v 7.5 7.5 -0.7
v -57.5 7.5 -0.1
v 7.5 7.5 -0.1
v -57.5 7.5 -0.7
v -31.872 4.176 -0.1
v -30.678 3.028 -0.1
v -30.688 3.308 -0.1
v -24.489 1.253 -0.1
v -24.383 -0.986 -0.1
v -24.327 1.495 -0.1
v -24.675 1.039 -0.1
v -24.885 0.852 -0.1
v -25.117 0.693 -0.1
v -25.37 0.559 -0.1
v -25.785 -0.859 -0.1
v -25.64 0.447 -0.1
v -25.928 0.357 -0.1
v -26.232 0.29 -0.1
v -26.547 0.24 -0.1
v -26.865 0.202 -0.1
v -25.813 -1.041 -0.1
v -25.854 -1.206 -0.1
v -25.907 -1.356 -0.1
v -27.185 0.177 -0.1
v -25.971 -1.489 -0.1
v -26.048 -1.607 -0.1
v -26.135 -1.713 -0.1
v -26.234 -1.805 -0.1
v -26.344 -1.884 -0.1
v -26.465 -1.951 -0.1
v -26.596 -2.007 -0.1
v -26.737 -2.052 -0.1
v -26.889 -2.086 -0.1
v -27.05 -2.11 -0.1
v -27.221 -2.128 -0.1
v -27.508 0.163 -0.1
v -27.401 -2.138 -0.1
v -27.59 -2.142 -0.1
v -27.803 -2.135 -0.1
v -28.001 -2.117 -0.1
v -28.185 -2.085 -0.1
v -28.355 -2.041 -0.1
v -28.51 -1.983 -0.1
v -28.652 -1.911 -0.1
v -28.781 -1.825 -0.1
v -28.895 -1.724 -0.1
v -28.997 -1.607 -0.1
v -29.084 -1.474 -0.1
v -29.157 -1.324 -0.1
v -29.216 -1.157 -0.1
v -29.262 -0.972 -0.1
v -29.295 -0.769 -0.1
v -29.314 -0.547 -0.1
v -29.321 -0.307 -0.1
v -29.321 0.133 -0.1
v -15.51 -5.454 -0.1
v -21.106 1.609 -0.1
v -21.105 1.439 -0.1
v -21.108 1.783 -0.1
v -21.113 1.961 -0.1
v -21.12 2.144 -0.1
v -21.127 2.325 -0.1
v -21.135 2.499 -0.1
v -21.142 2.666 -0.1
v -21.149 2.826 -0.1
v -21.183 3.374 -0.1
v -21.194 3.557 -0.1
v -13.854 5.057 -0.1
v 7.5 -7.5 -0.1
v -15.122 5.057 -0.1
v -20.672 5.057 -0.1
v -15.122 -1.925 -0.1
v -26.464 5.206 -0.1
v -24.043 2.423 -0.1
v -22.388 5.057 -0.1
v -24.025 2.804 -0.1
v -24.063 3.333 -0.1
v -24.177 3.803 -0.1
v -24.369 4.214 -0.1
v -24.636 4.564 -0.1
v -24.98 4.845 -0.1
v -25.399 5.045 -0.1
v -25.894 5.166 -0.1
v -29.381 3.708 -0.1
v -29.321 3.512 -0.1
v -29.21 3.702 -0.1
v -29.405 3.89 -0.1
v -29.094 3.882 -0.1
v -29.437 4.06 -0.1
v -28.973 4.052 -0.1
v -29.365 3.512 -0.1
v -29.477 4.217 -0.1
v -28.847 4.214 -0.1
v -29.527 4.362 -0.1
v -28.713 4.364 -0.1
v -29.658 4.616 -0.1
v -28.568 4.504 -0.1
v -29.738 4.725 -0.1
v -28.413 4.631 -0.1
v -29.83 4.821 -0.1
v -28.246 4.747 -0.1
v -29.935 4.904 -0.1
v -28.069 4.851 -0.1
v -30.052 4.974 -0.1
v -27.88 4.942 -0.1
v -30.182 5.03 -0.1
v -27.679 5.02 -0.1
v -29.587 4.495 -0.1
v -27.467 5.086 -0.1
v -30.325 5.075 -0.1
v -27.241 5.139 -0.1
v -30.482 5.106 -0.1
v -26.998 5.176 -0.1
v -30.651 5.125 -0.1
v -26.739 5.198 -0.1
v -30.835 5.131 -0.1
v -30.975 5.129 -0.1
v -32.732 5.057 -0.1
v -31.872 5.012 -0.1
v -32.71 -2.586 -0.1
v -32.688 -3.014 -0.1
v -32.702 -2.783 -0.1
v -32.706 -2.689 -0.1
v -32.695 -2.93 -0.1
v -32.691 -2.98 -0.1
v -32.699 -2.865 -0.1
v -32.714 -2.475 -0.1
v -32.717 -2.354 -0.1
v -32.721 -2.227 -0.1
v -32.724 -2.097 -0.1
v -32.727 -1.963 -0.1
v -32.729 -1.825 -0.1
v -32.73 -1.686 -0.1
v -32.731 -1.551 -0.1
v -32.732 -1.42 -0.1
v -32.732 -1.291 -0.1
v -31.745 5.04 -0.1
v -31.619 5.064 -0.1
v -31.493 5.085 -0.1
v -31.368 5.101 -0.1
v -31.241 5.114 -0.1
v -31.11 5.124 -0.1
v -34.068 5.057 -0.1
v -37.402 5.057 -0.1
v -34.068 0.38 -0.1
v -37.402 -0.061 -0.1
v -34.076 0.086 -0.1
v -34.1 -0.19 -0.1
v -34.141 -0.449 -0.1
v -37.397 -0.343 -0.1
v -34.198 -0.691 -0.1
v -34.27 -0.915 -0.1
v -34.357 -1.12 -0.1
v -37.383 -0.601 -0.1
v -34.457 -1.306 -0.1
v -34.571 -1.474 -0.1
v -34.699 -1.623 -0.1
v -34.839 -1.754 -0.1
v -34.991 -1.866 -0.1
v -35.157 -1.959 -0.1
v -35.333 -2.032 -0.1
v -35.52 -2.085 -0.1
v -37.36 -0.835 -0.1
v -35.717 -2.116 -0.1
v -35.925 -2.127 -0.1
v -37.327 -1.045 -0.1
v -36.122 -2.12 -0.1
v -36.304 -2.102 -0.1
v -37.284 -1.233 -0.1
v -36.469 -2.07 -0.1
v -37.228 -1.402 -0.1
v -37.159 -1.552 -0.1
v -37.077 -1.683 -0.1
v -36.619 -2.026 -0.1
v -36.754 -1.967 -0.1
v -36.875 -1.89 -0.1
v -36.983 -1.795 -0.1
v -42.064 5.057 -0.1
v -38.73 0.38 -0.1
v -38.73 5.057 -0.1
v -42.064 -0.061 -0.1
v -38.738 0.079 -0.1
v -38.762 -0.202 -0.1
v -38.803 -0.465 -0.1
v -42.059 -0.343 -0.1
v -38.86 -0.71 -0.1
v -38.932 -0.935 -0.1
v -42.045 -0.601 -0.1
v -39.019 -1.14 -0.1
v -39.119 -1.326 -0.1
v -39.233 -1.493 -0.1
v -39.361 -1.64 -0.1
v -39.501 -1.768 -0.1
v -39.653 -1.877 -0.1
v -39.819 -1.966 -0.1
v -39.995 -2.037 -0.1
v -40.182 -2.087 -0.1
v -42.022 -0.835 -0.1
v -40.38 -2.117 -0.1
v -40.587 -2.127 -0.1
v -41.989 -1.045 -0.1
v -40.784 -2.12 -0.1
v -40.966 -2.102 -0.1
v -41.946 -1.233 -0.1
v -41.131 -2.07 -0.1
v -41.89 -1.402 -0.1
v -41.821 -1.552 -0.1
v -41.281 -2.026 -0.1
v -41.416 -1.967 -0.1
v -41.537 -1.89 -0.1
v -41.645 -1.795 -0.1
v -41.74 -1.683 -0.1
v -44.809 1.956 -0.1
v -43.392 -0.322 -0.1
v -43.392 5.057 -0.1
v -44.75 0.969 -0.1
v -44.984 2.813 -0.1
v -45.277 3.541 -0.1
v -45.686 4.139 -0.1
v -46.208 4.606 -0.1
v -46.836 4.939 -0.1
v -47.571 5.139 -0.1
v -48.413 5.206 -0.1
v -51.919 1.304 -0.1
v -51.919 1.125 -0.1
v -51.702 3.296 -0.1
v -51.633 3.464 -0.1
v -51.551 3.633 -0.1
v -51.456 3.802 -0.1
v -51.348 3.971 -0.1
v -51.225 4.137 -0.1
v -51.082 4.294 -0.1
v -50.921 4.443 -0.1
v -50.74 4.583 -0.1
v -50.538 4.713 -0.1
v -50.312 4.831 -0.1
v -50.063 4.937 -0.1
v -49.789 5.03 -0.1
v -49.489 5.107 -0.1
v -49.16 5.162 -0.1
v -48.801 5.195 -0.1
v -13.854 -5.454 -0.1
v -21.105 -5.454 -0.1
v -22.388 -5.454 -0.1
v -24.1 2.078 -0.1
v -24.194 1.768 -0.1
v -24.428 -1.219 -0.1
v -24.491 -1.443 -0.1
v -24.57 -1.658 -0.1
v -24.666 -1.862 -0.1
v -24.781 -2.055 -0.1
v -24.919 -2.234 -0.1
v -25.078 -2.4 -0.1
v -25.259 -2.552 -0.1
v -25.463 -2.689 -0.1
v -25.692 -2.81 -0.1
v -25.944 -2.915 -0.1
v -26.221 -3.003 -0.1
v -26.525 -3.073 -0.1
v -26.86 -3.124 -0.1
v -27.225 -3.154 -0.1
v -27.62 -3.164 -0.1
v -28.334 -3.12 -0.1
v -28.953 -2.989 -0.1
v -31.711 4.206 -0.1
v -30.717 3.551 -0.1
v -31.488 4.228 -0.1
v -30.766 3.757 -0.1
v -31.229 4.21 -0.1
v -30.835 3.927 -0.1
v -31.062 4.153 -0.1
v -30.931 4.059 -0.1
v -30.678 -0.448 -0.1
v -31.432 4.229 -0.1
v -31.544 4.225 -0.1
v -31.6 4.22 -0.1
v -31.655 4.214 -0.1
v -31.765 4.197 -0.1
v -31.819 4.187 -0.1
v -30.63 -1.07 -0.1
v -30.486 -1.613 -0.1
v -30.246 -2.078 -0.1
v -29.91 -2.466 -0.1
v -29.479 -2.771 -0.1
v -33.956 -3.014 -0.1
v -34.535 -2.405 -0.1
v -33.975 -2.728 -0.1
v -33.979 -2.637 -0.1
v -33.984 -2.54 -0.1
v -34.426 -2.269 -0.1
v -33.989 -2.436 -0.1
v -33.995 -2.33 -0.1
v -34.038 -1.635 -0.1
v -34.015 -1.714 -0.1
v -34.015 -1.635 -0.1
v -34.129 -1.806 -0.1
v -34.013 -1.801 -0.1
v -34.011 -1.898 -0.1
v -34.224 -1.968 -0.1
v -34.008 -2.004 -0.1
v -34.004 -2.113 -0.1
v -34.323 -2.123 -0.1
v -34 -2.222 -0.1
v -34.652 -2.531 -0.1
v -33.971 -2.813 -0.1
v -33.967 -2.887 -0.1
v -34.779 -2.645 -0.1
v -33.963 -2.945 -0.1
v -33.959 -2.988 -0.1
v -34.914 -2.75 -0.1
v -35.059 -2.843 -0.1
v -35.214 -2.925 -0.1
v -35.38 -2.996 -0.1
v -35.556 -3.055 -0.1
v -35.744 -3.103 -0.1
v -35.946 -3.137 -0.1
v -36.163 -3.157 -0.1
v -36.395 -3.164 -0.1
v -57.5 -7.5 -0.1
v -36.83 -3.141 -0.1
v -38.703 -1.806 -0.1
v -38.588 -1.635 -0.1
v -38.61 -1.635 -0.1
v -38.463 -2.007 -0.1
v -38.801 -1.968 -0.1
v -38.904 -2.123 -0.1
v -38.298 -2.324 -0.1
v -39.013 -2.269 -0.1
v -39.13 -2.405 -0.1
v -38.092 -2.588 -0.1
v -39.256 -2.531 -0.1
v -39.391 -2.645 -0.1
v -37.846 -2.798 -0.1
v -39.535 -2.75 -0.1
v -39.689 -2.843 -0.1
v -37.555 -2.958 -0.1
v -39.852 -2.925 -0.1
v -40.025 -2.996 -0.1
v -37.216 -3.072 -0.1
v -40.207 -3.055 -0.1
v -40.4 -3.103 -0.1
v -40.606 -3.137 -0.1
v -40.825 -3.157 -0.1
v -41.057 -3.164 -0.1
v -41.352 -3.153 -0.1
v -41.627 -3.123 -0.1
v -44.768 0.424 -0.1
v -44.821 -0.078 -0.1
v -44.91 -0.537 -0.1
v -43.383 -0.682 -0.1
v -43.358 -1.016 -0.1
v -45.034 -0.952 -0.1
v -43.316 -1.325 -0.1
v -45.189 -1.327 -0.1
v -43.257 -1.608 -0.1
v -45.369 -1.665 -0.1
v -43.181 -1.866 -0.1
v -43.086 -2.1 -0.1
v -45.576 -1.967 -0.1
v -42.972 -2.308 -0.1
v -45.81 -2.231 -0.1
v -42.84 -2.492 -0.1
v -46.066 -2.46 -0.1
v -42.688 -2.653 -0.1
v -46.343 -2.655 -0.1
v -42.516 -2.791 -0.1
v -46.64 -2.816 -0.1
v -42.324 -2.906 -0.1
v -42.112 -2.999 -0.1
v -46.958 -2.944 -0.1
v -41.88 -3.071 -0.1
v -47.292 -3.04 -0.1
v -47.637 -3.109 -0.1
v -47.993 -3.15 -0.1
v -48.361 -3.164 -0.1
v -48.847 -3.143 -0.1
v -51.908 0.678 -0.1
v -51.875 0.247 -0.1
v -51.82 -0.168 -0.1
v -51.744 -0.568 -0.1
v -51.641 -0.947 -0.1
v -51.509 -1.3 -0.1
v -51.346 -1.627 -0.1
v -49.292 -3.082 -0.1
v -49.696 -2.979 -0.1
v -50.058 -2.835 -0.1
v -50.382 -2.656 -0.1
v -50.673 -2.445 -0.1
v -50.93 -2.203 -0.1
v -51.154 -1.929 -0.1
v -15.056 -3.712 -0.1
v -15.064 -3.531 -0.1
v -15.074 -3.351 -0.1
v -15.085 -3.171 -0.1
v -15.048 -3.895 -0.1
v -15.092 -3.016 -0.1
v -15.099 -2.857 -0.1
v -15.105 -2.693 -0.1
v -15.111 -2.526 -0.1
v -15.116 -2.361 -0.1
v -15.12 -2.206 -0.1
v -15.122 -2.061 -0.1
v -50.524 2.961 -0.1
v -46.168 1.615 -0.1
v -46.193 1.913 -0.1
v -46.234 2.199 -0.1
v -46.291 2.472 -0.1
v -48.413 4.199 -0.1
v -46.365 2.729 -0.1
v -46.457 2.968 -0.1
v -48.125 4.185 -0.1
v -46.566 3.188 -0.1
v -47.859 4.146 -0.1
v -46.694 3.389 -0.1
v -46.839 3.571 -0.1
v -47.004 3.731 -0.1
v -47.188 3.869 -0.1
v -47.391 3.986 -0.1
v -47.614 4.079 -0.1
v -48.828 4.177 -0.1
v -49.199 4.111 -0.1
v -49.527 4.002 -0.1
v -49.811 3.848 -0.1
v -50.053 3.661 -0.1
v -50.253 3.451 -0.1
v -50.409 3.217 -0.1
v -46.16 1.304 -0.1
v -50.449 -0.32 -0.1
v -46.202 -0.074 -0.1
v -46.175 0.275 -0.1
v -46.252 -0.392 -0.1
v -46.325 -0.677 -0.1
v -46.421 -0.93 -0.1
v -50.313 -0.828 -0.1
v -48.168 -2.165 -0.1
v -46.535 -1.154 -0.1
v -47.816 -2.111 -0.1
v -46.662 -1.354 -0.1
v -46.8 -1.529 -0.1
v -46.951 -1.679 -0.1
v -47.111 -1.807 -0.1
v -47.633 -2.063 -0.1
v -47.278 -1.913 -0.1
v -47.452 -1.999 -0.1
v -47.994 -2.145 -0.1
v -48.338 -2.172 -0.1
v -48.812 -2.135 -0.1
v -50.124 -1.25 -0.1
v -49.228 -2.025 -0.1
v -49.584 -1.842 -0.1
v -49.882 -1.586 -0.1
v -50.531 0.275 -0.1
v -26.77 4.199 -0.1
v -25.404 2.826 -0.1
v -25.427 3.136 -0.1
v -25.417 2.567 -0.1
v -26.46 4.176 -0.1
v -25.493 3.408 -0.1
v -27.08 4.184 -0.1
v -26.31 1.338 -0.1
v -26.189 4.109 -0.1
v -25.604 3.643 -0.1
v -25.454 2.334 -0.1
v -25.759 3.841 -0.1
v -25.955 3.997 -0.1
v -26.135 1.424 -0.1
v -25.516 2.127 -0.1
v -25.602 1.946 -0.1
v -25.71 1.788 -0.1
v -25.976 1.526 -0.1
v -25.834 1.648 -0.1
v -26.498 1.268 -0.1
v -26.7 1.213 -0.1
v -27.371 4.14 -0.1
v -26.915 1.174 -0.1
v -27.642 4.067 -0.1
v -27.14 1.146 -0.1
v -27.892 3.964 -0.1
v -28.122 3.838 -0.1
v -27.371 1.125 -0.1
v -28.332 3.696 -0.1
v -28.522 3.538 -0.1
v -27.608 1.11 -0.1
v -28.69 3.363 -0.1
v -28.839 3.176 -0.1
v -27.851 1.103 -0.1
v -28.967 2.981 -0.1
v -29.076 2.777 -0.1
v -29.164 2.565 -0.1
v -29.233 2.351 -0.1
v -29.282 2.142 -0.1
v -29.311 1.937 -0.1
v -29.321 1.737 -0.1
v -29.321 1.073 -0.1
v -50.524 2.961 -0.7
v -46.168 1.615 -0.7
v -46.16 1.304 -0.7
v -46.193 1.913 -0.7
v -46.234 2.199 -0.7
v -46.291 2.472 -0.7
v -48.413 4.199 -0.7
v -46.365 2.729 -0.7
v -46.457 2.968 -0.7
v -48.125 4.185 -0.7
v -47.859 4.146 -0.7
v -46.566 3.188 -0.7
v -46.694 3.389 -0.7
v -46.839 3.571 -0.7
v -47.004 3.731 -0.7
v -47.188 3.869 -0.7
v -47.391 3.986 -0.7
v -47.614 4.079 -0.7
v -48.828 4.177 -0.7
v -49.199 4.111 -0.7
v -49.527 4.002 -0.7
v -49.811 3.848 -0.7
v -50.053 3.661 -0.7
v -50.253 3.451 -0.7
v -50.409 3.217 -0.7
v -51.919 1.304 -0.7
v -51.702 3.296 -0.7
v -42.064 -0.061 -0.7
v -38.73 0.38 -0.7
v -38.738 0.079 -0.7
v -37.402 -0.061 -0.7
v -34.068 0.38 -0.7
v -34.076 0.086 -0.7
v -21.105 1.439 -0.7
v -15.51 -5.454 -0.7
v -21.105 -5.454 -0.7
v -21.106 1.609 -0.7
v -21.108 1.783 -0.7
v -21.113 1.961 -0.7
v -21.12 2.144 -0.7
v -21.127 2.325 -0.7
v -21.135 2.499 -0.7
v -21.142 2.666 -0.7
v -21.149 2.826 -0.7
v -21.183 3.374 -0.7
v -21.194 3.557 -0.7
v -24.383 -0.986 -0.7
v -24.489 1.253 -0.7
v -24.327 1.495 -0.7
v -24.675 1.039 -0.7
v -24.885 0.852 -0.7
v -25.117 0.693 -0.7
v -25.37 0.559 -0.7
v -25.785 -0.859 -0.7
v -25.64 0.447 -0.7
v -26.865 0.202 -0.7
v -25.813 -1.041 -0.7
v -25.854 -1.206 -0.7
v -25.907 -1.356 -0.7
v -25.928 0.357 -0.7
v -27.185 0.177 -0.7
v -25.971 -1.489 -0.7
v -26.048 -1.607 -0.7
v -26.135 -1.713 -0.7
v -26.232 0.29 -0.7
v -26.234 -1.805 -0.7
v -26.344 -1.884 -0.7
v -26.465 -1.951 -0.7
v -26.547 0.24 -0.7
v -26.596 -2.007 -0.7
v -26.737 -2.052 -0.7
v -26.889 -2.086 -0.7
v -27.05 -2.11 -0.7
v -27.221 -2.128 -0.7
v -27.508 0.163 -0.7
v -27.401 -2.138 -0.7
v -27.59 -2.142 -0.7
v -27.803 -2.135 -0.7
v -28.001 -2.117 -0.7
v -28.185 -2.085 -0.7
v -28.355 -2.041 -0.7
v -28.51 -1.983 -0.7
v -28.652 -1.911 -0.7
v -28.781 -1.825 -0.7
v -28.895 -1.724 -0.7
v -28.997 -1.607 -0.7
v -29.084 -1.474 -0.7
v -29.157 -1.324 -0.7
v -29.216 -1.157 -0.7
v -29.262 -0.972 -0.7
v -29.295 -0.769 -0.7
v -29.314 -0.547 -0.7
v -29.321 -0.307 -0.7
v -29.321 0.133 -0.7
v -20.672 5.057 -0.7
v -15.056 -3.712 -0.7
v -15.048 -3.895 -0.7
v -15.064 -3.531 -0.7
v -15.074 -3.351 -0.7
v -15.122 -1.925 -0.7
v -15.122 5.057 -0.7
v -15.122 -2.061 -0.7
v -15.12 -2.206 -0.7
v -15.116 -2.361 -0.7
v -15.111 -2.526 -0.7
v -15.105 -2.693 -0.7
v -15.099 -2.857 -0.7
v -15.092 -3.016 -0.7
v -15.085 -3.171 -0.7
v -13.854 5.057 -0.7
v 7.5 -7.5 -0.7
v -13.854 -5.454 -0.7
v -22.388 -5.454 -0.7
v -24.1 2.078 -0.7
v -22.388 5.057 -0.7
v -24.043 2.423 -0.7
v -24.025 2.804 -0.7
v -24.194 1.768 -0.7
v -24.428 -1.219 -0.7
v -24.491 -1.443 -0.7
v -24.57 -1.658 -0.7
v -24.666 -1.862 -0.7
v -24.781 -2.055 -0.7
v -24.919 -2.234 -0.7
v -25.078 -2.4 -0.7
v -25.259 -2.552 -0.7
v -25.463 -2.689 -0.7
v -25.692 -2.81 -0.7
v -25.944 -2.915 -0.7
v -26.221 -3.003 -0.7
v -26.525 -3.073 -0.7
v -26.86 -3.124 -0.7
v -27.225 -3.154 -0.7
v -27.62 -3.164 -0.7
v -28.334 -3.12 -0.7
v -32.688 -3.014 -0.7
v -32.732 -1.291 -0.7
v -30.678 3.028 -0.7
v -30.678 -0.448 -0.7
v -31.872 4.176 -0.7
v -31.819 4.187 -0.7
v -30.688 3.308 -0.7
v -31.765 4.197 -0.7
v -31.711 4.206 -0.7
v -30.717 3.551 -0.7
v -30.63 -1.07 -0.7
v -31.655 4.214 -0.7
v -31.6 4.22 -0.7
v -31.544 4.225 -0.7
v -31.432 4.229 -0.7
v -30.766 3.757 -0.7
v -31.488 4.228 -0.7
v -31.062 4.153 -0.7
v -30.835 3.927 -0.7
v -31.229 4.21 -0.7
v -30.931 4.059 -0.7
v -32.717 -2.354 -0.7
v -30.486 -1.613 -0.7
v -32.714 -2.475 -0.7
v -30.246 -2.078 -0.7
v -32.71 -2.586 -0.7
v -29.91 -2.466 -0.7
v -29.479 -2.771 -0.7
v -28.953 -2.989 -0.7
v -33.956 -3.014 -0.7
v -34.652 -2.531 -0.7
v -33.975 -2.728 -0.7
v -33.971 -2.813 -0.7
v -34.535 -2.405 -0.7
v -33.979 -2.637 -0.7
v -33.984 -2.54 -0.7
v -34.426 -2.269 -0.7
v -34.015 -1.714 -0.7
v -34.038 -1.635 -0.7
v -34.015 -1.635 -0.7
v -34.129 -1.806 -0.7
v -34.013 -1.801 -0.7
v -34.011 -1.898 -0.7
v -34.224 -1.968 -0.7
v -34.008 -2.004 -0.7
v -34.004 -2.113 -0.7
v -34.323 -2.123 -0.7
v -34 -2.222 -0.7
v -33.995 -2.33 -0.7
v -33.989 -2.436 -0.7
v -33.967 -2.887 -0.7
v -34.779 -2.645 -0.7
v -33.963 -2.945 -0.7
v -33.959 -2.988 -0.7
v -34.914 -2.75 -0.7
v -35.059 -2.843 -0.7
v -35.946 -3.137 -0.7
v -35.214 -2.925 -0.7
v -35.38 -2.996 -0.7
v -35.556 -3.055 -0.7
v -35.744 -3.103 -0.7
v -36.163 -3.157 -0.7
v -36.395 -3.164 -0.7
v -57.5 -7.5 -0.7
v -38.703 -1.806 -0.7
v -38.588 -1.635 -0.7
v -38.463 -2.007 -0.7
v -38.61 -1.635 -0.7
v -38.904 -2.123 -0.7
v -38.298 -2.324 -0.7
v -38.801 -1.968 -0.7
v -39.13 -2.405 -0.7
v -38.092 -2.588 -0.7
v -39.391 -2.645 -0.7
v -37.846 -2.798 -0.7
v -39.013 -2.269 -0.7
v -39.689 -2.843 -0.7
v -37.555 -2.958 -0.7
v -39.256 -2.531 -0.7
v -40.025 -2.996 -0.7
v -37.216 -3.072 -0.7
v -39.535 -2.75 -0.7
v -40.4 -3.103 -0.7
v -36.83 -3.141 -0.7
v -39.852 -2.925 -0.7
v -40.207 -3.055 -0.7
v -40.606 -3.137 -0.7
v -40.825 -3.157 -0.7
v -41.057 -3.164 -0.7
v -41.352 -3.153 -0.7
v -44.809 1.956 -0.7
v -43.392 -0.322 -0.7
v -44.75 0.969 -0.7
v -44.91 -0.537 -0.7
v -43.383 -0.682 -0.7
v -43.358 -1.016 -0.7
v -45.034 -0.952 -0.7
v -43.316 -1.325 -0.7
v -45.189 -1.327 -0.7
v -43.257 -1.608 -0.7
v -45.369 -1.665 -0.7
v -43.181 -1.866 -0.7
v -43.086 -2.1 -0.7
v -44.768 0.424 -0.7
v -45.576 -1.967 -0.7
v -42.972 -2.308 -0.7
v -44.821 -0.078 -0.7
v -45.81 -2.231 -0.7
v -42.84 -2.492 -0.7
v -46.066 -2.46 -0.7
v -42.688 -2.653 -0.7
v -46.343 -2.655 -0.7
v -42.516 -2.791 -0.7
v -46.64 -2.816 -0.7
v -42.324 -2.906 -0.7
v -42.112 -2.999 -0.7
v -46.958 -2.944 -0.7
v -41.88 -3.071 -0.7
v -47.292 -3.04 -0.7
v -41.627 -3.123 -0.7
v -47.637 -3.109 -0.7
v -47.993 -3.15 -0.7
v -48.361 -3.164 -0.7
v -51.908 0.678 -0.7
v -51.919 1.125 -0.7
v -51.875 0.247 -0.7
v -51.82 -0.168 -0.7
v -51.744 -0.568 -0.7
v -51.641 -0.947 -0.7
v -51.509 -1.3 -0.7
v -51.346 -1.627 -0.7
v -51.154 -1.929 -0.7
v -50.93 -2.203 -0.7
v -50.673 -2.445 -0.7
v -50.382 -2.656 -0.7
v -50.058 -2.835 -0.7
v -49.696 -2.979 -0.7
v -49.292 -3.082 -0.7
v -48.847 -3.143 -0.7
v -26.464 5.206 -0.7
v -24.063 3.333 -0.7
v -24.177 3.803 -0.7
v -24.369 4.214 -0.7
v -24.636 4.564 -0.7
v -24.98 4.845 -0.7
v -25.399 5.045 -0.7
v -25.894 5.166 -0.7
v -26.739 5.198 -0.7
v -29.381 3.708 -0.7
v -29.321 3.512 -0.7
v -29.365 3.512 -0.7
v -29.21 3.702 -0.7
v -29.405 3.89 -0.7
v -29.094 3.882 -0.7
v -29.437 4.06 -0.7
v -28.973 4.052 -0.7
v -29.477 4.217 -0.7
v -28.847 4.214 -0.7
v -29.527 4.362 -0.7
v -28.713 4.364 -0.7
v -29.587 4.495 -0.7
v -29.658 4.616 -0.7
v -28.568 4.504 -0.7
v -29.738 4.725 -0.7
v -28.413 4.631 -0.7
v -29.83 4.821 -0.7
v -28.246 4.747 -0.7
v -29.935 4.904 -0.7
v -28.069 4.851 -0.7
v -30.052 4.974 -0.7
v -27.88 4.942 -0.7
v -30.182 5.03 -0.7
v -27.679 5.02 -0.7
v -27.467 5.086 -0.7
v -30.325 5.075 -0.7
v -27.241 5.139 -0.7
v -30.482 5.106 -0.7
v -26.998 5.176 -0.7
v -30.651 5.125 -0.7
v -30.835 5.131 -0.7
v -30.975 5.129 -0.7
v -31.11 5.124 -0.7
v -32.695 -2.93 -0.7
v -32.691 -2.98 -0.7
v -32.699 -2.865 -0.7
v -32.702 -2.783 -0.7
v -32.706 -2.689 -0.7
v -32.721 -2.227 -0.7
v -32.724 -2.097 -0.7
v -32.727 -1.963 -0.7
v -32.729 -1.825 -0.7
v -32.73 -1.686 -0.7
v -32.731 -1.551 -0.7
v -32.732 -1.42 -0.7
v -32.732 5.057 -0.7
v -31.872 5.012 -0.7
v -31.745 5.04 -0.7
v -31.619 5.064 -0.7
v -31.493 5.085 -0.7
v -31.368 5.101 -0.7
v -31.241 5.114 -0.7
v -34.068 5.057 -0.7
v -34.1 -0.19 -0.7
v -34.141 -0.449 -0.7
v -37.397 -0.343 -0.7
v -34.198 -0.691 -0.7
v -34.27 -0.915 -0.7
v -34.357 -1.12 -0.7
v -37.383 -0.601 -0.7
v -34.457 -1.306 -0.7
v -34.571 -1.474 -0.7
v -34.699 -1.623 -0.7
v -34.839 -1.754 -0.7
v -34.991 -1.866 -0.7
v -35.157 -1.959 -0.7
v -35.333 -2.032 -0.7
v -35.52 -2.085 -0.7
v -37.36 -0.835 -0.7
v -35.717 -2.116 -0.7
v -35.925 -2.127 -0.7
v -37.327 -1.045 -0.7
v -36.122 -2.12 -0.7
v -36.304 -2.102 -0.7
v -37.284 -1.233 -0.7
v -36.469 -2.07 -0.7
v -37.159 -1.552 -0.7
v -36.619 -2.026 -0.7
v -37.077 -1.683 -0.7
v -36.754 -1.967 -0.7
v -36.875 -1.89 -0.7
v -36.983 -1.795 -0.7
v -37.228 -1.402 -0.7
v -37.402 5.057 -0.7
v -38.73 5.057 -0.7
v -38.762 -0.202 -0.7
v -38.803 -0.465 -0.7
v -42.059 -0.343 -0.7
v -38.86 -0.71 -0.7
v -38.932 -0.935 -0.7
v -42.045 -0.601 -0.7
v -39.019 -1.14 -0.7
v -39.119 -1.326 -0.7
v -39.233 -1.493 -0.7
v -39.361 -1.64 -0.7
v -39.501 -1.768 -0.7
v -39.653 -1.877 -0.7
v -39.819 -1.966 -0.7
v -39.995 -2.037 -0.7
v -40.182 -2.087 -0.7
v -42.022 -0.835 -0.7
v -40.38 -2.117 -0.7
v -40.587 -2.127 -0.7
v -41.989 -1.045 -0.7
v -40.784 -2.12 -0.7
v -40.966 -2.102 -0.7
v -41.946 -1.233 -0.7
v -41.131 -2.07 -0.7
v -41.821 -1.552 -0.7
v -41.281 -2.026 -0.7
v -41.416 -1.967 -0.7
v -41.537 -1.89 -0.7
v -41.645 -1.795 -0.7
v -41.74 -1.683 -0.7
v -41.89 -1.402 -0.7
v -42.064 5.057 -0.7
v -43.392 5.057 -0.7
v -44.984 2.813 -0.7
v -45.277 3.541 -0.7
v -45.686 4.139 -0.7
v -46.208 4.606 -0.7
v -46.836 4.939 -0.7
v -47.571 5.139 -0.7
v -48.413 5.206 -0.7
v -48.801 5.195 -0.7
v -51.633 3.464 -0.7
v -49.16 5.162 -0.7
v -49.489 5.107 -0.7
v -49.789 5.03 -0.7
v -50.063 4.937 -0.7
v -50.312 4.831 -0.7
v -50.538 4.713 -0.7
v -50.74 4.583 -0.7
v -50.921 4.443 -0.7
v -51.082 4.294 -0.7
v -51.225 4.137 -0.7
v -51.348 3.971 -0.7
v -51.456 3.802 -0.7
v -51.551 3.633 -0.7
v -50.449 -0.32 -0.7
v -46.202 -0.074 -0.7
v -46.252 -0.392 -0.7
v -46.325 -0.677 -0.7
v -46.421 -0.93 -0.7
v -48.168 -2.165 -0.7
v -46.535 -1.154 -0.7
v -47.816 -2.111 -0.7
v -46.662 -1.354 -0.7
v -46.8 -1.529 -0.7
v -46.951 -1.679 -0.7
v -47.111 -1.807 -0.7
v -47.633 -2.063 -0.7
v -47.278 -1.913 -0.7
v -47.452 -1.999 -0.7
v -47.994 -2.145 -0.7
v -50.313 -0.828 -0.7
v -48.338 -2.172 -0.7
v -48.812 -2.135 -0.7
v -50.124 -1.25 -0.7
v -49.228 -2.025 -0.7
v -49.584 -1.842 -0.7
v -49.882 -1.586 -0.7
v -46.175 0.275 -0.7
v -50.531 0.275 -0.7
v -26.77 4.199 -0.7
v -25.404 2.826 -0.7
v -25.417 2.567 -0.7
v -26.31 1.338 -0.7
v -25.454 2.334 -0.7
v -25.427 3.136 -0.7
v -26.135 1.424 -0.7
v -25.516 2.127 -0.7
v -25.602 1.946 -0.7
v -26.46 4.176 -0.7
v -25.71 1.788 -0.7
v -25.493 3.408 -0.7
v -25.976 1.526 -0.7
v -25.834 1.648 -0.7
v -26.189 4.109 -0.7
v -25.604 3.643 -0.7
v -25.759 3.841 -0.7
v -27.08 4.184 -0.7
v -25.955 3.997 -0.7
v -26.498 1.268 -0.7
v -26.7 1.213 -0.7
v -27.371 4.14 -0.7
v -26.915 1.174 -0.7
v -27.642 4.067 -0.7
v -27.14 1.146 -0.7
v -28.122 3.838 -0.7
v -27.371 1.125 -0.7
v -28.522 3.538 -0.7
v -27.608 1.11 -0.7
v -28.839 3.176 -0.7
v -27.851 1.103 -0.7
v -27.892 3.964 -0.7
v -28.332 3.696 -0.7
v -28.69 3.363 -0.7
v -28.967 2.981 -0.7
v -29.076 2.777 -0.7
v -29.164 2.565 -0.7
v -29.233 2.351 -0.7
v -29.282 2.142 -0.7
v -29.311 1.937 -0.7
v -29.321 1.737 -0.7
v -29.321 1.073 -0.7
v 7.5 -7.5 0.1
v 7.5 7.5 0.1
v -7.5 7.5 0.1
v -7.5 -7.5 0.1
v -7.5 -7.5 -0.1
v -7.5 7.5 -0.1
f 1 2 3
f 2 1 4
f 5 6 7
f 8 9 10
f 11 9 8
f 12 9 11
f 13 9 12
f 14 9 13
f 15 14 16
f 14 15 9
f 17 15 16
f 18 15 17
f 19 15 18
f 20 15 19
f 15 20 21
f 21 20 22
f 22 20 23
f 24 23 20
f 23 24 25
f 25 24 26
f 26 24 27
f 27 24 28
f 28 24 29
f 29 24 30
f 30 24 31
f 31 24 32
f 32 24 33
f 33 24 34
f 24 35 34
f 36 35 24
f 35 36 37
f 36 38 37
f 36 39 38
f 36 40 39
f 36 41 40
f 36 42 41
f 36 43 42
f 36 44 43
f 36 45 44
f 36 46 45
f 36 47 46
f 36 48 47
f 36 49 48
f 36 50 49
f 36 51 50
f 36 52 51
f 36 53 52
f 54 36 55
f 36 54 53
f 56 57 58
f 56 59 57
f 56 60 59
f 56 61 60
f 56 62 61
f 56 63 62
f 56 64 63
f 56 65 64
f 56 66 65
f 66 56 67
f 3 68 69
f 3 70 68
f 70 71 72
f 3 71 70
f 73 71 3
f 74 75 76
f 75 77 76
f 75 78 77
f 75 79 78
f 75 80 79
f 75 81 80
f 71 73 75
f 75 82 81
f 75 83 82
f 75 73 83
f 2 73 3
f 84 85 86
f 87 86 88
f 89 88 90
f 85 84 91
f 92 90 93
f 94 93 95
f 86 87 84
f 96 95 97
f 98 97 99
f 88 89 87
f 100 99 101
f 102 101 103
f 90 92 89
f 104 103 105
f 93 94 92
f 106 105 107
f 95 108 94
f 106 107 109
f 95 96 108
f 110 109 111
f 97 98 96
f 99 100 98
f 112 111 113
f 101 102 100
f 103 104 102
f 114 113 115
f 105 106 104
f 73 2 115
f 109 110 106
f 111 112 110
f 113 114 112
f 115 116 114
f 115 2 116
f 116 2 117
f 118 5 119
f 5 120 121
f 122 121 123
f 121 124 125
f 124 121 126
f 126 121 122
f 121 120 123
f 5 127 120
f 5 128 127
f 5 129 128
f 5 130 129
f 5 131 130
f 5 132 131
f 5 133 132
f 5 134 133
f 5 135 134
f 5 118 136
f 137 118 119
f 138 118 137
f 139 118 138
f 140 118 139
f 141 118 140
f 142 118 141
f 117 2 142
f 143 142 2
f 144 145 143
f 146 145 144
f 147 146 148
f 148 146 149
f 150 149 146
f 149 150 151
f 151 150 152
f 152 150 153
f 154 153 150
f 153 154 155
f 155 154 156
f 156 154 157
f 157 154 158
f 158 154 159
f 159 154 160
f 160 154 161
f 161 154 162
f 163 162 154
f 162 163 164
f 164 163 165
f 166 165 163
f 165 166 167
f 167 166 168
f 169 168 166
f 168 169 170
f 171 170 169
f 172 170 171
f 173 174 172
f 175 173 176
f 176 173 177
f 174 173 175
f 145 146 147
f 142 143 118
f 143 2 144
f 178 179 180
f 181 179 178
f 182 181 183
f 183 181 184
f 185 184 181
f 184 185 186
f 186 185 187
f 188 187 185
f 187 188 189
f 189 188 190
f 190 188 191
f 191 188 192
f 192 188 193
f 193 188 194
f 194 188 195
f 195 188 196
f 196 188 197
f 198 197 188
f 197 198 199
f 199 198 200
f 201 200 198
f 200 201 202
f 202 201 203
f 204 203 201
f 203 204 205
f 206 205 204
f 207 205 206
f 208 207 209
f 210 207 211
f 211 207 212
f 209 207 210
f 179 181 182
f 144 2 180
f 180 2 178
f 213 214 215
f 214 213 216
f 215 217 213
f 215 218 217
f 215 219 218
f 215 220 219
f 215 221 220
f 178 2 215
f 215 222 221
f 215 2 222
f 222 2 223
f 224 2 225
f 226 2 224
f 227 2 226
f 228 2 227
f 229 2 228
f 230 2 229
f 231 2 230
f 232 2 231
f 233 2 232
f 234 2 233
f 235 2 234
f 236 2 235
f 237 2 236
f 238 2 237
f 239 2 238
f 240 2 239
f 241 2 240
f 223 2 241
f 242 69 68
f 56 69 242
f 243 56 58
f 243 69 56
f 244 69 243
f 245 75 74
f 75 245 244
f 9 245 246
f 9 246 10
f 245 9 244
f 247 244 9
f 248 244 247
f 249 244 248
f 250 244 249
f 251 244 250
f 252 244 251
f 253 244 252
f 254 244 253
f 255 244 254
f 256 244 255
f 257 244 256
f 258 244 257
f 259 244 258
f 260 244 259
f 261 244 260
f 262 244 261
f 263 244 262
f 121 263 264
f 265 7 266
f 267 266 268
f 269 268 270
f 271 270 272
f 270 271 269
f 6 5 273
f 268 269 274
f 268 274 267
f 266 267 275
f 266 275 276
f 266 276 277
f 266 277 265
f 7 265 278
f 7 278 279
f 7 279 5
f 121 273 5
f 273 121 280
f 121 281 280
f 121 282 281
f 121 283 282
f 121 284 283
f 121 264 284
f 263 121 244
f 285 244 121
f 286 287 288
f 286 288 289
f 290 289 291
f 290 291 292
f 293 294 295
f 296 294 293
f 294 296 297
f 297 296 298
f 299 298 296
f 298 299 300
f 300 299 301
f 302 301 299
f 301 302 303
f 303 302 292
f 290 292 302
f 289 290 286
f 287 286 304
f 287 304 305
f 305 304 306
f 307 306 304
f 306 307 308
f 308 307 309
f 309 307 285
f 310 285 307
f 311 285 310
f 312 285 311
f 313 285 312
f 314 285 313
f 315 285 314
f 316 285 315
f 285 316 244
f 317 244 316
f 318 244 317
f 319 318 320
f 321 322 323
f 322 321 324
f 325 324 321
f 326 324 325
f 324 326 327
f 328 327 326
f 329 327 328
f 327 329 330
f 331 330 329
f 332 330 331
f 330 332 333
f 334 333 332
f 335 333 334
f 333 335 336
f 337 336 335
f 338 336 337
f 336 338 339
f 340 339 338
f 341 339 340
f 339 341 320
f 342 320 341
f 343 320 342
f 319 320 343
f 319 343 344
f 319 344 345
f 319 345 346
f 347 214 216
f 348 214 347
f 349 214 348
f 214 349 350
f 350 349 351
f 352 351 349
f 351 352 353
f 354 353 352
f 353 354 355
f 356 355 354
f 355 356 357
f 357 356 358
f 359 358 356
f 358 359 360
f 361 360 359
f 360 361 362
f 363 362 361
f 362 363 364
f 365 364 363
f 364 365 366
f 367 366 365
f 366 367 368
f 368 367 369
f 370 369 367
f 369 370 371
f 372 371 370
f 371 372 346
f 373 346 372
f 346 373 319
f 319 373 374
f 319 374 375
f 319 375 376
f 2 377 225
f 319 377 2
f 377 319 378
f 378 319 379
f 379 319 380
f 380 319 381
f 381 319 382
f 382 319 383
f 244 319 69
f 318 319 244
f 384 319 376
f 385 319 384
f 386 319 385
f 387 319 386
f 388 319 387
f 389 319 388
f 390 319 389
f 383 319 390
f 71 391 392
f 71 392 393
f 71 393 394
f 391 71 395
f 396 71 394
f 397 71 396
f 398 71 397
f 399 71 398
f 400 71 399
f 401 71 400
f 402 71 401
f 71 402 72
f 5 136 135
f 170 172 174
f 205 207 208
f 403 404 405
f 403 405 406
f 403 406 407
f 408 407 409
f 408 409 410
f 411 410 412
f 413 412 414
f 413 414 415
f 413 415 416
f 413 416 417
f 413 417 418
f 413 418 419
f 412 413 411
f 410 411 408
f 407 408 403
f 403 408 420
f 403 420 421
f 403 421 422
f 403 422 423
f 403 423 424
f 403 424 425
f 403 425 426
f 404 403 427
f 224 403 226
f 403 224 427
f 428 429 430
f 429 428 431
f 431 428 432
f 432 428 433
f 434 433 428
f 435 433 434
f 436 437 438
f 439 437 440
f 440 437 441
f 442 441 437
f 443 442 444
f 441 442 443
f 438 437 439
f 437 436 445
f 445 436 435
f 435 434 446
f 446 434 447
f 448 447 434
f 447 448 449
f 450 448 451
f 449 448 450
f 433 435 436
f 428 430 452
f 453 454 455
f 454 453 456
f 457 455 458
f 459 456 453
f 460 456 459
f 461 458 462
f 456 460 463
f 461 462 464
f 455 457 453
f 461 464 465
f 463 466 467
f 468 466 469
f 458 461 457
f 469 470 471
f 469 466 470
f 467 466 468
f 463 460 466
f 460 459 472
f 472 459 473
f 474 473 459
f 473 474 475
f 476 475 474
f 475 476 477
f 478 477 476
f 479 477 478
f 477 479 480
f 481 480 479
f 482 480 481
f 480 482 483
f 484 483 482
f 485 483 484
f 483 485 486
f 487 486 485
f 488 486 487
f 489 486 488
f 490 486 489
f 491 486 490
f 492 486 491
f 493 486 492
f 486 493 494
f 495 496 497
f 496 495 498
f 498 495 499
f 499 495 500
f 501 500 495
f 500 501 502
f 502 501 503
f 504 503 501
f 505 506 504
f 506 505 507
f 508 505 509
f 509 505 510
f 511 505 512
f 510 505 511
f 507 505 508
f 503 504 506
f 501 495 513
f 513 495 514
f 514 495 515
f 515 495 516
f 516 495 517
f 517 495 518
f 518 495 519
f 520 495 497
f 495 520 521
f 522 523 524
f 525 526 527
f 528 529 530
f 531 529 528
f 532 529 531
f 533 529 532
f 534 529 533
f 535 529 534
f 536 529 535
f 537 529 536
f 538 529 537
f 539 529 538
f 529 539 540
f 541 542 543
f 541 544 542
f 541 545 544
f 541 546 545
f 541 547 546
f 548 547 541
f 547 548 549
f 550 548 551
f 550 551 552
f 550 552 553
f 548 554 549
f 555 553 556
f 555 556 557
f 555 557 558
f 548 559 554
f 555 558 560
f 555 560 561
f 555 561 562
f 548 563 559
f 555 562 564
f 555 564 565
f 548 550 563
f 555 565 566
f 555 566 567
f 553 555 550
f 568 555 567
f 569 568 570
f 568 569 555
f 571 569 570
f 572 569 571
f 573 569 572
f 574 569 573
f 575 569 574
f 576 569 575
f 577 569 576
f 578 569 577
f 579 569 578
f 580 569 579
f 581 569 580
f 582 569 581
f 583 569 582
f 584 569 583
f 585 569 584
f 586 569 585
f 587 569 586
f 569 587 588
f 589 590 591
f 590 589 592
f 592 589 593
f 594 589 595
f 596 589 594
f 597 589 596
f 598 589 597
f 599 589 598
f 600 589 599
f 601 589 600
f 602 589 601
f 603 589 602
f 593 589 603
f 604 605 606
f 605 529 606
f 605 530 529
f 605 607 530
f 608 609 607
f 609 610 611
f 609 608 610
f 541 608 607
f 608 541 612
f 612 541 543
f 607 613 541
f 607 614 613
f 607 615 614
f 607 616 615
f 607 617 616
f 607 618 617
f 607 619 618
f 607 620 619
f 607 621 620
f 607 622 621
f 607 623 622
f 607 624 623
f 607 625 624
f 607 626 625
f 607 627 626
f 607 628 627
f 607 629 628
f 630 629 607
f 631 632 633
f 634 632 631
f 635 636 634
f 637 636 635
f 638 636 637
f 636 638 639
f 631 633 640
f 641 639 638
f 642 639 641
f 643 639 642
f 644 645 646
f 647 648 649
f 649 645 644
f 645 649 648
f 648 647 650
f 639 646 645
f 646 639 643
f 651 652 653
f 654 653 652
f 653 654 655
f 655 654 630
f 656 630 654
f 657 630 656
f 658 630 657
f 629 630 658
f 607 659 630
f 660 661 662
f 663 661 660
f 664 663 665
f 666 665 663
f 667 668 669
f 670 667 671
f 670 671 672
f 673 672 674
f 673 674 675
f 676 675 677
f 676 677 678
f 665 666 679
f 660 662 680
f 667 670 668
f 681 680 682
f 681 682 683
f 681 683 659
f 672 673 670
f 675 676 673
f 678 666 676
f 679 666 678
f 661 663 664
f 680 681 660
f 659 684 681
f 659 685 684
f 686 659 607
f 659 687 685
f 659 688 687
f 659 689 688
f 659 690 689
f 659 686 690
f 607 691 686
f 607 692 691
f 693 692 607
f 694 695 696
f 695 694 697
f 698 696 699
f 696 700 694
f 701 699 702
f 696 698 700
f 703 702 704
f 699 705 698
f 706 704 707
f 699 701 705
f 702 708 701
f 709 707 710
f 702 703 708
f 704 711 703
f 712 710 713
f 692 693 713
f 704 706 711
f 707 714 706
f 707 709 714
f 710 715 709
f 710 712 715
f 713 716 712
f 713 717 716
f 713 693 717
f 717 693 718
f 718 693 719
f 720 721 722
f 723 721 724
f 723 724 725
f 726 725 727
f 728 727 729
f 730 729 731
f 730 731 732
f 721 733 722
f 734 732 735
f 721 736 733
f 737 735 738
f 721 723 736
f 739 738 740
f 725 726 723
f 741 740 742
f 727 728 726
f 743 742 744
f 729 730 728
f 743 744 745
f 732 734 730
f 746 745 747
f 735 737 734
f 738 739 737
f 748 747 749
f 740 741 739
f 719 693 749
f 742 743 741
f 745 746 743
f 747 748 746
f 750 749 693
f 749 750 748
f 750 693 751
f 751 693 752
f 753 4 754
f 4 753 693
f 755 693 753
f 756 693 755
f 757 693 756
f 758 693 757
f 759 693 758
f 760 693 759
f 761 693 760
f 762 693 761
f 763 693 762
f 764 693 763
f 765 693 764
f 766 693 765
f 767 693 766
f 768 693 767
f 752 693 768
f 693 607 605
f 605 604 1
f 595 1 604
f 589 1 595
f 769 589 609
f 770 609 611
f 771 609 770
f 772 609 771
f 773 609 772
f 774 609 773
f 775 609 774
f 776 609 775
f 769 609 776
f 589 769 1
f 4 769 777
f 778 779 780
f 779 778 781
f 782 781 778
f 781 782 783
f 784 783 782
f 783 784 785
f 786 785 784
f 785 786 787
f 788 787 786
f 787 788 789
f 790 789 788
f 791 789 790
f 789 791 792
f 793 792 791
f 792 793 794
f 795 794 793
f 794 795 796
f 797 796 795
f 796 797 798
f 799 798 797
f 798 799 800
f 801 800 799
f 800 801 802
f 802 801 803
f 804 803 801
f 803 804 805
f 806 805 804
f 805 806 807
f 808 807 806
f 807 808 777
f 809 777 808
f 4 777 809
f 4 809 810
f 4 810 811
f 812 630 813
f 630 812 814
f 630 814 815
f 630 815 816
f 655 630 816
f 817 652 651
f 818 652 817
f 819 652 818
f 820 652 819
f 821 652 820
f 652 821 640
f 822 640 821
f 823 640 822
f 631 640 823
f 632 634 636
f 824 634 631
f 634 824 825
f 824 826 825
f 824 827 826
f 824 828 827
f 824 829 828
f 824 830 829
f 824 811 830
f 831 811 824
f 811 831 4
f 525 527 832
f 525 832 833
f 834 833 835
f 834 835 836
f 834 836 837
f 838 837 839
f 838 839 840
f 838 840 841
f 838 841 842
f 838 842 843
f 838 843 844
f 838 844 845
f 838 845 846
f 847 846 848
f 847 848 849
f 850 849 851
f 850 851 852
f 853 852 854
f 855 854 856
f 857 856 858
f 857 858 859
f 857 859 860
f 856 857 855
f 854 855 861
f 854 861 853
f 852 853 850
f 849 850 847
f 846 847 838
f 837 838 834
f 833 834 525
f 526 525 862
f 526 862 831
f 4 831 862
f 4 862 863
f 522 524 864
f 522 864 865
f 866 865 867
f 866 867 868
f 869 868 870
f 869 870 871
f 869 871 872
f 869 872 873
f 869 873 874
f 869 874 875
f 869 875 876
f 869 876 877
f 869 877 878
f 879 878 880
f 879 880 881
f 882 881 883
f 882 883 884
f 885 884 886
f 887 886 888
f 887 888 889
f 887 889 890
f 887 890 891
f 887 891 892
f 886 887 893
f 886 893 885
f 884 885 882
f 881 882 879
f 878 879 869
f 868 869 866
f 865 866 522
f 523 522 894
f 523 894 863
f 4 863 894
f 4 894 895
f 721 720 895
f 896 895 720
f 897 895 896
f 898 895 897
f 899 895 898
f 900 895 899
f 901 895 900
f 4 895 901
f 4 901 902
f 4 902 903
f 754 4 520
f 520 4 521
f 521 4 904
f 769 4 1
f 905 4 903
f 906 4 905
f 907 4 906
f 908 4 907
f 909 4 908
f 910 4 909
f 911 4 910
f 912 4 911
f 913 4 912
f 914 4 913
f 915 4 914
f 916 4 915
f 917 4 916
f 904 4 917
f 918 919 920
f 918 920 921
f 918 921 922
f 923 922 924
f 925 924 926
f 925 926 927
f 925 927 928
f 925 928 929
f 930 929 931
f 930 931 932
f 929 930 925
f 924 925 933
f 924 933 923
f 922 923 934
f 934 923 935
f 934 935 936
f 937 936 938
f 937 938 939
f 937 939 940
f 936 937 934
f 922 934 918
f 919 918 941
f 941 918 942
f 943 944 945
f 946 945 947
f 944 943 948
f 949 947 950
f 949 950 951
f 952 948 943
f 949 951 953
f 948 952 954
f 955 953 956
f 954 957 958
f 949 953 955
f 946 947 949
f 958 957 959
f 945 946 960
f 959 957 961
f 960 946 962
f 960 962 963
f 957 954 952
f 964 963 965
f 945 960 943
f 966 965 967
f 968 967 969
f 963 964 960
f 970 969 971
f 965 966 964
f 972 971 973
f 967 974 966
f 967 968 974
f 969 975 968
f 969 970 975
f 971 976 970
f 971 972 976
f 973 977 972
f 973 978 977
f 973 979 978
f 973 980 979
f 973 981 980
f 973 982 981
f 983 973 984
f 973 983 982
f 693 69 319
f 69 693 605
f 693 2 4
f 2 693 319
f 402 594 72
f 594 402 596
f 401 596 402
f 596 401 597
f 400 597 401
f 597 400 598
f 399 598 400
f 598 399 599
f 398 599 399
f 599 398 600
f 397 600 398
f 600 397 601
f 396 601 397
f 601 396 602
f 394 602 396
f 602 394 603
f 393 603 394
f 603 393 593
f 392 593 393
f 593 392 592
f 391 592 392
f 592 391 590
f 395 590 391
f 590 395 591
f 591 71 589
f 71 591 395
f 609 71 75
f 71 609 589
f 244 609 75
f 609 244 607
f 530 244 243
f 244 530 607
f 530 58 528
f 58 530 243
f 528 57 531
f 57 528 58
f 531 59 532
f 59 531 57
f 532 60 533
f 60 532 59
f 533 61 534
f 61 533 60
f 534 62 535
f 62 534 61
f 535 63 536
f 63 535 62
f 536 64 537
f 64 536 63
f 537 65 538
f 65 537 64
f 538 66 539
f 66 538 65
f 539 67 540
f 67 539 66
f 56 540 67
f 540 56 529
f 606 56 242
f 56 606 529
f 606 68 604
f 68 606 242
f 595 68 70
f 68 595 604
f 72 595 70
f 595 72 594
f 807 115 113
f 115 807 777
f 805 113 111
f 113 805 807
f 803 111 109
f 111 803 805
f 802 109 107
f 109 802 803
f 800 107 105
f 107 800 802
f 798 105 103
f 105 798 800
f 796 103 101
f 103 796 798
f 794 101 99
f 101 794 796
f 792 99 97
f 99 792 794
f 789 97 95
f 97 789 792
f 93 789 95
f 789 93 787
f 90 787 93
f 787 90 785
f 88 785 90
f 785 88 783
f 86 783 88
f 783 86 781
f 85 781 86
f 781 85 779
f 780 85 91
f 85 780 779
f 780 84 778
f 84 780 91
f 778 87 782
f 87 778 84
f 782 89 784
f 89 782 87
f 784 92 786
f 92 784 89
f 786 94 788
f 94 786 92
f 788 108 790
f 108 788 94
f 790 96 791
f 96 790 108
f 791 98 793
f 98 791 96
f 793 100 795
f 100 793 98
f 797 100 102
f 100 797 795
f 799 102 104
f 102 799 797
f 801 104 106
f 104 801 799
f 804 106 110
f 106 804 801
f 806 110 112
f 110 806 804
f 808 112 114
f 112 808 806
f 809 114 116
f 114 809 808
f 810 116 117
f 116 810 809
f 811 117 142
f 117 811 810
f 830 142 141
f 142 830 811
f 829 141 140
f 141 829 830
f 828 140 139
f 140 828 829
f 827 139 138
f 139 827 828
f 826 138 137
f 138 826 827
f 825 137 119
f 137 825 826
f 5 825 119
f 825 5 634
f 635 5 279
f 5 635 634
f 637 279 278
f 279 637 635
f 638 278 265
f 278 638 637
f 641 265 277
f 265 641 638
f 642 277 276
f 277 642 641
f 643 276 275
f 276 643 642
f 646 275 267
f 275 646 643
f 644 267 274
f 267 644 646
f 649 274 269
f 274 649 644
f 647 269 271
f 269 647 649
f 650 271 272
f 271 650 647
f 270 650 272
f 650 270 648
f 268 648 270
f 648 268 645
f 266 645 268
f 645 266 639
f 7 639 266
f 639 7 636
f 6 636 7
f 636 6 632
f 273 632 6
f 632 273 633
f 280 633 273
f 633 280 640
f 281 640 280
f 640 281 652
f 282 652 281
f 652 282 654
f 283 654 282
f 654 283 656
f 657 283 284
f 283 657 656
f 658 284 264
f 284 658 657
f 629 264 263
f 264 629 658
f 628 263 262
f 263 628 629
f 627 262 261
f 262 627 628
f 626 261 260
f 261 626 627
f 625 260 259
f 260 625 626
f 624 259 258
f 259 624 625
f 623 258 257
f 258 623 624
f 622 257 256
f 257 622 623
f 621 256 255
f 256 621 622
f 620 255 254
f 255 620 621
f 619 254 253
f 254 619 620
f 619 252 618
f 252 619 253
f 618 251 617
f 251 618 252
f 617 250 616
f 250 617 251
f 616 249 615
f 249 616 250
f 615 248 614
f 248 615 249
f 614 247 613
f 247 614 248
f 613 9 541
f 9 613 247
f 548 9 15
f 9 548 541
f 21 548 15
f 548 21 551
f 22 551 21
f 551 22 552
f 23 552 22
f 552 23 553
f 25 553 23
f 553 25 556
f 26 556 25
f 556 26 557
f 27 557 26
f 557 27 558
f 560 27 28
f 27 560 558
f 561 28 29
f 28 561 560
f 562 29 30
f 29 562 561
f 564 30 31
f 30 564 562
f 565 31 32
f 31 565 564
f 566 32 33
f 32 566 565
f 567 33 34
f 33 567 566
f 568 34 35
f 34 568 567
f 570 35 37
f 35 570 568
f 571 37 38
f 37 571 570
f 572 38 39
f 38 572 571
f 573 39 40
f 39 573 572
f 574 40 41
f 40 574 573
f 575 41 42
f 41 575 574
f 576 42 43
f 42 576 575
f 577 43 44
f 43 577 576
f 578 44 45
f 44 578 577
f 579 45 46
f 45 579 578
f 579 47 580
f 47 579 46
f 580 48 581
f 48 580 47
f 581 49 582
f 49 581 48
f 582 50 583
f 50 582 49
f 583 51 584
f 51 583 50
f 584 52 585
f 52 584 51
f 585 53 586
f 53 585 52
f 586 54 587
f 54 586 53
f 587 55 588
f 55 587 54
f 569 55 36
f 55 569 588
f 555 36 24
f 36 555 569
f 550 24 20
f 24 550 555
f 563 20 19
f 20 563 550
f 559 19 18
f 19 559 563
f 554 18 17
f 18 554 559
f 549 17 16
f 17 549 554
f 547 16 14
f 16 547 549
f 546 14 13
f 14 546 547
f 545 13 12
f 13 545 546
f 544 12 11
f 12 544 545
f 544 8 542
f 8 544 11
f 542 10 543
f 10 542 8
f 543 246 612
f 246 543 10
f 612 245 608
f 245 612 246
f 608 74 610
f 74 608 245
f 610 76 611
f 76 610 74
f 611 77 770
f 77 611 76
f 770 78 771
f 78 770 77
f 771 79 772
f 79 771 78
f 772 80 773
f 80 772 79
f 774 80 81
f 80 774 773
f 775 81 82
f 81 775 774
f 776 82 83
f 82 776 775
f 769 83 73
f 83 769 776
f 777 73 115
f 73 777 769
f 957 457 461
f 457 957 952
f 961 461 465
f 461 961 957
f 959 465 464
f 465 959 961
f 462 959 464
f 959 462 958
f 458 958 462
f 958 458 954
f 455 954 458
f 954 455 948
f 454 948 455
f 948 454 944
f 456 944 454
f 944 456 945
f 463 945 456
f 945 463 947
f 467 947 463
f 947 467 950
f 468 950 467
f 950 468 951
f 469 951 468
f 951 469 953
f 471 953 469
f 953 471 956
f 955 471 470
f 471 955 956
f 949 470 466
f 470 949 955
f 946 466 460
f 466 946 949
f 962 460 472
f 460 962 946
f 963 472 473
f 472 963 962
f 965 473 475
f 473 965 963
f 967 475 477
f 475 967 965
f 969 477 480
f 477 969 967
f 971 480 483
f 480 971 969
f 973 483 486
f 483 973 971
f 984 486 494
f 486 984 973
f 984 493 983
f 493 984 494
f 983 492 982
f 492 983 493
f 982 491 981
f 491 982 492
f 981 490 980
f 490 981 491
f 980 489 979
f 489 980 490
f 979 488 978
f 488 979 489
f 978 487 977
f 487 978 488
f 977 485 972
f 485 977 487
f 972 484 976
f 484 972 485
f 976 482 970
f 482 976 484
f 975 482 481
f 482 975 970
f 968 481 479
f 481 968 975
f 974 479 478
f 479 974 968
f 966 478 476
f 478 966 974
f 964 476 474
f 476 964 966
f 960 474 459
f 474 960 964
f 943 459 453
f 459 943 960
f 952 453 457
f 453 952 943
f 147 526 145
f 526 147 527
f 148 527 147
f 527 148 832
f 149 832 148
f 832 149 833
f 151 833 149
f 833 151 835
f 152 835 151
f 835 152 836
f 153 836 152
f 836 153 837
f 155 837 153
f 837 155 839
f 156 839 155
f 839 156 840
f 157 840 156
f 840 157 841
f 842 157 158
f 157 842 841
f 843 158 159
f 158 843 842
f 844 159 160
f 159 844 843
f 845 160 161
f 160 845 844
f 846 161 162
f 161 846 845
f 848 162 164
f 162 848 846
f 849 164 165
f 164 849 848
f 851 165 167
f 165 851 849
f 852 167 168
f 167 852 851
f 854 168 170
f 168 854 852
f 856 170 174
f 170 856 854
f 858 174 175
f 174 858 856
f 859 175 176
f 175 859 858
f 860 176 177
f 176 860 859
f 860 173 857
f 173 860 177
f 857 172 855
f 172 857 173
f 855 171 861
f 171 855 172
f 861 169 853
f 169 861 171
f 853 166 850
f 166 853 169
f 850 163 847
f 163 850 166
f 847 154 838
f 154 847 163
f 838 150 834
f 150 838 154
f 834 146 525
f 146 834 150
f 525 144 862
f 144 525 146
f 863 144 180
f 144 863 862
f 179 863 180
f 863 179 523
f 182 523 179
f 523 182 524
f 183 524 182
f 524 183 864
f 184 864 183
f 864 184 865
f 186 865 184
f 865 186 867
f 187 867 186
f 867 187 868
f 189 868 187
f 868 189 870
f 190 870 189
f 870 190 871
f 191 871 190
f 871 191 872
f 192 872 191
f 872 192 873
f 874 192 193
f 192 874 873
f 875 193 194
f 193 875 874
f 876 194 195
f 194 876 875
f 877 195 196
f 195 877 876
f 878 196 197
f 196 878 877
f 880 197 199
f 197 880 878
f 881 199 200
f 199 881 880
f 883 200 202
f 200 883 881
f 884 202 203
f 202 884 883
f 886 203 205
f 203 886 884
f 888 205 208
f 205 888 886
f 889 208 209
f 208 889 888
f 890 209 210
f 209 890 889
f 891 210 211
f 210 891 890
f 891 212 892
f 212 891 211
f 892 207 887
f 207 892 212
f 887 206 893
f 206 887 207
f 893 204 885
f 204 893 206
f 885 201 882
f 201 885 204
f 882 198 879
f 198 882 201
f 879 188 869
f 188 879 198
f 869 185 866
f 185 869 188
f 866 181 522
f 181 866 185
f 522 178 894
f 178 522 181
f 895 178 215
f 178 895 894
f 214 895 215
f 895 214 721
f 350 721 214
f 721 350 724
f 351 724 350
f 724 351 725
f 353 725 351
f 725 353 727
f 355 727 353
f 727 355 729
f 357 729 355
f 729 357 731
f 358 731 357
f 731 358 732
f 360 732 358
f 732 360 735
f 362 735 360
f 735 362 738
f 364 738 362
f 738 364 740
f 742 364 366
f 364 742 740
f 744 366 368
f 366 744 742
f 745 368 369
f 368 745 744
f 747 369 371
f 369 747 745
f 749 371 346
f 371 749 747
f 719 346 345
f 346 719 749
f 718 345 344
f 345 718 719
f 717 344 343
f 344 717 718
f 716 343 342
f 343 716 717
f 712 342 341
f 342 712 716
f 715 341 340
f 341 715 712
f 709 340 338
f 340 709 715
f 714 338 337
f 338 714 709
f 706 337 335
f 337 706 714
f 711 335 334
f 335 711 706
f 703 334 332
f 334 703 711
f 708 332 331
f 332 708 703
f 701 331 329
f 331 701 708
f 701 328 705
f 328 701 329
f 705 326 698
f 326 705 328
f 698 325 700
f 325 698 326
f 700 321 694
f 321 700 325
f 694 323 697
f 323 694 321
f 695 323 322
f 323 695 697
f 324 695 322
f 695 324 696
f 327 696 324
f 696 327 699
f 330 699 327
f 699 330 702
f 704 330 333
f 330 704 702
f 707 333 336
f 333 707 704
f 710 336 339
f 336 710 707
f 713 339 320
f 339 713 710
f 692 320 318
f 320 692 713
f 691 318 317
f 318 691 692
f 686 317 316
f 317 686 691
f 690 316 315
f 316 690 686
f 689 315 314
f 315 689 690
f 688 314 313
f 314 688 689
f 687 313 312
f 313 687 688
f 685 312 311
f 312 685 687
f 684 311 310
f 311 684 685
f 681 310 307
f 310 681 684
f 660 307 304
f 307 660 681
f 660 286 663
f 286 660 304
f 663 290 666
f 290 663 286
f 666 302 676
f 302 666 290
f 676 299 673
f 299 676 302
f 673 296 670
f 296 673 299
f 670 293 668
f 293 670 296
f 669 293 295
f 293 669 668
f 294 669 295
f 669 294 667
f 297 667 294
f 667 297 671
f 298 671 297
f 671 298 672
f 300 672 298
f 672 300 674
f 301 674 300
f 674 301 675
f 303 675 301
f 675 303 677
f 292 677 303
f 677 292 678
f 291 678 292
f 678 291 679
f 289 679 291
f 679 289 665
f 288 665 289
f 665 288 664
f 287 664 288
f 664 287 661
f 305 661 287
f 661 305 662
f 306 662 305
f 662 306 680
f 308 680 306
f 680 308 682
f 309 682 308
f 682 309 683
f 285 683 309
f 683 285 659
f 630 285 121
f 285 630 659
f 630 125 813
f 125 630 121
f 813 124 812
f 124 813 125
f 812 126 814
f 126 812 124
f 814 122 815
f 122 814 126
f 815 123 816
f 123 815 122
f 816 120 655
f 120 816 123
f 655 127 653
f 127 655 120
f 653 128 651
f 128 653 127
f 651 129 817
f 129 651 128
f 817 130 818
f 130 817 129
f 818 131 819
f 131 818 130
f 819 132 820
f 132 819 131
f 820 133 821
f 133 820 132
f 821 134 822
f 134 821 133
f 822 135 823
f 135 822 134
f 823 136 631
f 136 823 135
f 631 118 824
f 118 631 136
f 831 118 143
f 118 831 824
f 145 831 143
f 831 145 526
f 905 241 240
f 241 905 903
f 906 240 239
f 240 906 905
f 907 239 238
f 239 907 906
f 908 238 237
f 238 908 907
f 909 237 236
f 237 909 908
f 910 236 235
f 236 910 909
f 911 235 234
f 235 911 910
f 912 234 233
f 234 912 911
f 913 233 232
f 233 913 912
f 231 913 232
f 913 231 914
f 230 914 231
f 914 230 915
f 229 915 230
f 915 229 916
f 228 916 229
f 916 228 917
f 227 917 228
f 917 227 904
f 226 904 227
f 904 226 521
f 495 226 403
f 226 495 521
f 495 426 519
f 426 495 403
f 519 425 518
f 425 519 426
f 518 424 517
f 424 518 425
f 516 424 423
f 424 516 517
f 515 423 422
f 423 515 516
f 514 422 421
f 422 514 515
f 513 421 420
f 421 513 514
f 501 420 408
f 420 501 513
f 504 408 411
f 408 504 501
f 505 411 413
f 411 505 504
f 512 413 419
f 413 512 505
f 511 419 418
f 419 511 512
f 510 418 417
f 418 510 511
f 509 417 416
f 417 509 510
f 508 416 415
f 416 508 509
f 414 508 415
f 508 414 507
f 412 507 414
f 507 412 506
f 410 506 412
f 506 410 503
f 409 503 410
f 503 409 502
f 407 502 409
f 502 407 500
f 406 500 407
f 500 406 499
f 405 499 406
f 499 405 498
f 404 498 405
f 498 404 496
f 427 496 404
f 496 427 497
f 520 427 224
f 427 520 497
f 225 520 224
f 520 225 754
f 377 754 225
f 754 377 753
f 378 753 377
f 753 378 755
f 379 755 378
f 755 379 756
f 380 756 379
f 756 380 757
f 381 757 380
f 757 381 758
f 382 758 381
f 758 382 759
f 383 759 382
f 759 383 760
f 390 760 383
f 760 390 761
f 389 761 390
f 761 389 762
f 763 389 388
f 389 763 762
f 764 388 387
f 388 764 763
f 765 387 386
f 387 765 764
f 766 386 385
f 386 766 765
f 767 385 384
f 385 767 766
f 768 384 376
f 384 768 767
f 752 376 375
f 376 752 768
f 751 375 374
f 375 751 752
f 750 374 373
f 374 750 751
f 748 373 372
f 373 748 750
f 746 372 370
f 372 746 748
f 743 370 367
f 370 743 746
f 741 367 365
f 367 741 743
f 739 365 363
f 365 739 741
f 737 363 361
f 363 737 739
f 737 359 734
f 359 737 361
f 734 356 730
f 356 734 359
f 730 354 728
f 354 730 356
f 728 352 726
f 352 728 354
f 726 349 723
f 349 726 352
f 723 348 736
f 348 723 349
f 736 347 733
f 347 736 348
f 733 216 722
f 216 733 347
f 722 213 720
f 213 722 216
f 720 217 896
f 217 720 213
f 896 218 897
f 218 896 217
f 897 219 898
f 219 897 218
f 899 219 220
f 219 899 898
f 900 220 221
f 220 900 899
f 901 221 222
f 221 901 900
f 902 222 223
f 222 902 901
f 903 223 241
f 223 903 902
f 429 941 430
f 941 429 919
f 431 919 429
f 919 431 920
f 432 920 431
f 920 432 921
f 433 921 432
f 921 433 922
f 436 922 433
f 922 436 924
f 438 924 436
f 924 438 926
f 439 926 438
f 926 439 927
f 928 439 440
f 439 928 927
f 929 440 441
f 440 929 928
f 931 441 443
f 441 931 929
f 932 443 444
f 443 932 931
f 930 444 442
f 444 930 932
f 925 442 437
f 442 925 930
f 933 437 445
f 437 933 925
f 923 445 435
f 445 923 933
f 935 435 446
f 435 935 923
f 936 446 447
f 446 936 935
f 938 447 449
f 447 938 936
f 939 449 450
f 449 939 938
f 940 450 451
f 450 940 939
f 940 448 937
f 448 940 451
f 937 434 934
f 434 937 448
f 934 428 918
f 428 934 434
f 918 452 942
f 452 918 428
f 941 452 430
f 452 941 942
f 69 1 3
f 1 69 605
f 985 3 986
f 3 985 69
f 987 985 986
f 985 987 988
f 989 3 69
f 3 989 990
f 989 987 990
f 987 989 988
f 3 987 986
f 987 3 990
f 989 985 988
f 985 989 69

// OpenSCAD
// preview[view:north west, tilt:top diagonal]

/* Customizable Bookmark */


/* [Tag] */
// Text of the tag (use ♥ for heart)
text = "Name";
//Lenght of the tag
lenght = 50;//[20:1:100]
// Thickness of the tag
thick = 0.6; //[0.1:0.1:2]
/* [Head] */
//Thickness of the head
head_thick = 0.2; //[0.2:0.2:4]
//Height of the print on the head
head_height = 0.8; //[0.2:0.2:3]
//Rotation of image
rotation = 0;//[270:Bottom,0:Right,90:Top,180:Left]
//15x15 image on the head
image = "img.png";//[image_surface:61x61]

/*[ Miscellaneous] */
tag_color = "Crimson";
head_color = "Olive";
//Scale of image. You should NOT change that. 
image_scale = 1/15;
//Second scale for customizer. You should NOT change that. 
imgs = 1/4;
//If in customizer should be true. Do NOT change ! 
customizer = 1;//[1:True,0:False]

//// 0 : LOCAL ||||| 1 : CUSTOMIZER (Images are not generated the same way)


/* [Hidden] */
//Thickness to prevent 0 thick surface. DO NOT ALTER. 
over = 0.2;

//Width of the tag
width = 15;

//Space around the text
gap = 2;

//size of the head
head = width;

/*Start*/

/*We draw the tag and the text with the corresponding size*/
hsize = (width-(2*gap));
vsize = (lenght-gap)/(len(text));

//if(hsize*len(text)>(lenght-gap)) Change this if you want to change the size of the tag
rotate([0,0,90]) translate([0,lenght/2+head/2,-head_thick/2-thick/2]) if(hsize*len(text)>(lenght-gap)){//if(len(text)>=6){
    echo("Other size\n             ========");
   drawTag(width,lenght,thick,text,vsize,head);
}
else
{
   drawTag(width,lenght,thick,text,hsize,head);
}

/*We draw the head*/

color(head_color) rotate([0,0,rotation]) drawHead(head,head_thick,image,image_scale,head_height);



/*MODULES*/

//Let's draw the tag with the text
module drawTag(width,lenght,thick,string,textSize,head)
{
    union()
    {
    color(tag_color) difference(){
    cube([width,lenght,thick],center=true);
    translate([0,0,-thick/2-over/2]) linear_extrude(thick+over) rotate([0,0,90]) text(string,textSize,halign="center",valign="center");
    }
    color(head_color)
    translate([0,-lenght/2-head/2,0]) cube([width,head,thick],center=true);
    }
}

//Let's draw the head
module drawHead(head,head_thick,image,image_scale,head_height) {
    cube([head,head,head_thick],center=true);
    
    if(customizer==0)
    {
    translate([0,0,head_height+head_thick/2]) rotate([0,0,270]) scale([image_scale,image_scale,head_height/100]) surface(image,center=true,invert=true);
    }
    else
    {
        translate([0,0,head_thick/2+head_height/2+thick]) rotate([0,0,270]) scale([imgs,imgs,head_height]) surface(image,center=true);
    }
}
